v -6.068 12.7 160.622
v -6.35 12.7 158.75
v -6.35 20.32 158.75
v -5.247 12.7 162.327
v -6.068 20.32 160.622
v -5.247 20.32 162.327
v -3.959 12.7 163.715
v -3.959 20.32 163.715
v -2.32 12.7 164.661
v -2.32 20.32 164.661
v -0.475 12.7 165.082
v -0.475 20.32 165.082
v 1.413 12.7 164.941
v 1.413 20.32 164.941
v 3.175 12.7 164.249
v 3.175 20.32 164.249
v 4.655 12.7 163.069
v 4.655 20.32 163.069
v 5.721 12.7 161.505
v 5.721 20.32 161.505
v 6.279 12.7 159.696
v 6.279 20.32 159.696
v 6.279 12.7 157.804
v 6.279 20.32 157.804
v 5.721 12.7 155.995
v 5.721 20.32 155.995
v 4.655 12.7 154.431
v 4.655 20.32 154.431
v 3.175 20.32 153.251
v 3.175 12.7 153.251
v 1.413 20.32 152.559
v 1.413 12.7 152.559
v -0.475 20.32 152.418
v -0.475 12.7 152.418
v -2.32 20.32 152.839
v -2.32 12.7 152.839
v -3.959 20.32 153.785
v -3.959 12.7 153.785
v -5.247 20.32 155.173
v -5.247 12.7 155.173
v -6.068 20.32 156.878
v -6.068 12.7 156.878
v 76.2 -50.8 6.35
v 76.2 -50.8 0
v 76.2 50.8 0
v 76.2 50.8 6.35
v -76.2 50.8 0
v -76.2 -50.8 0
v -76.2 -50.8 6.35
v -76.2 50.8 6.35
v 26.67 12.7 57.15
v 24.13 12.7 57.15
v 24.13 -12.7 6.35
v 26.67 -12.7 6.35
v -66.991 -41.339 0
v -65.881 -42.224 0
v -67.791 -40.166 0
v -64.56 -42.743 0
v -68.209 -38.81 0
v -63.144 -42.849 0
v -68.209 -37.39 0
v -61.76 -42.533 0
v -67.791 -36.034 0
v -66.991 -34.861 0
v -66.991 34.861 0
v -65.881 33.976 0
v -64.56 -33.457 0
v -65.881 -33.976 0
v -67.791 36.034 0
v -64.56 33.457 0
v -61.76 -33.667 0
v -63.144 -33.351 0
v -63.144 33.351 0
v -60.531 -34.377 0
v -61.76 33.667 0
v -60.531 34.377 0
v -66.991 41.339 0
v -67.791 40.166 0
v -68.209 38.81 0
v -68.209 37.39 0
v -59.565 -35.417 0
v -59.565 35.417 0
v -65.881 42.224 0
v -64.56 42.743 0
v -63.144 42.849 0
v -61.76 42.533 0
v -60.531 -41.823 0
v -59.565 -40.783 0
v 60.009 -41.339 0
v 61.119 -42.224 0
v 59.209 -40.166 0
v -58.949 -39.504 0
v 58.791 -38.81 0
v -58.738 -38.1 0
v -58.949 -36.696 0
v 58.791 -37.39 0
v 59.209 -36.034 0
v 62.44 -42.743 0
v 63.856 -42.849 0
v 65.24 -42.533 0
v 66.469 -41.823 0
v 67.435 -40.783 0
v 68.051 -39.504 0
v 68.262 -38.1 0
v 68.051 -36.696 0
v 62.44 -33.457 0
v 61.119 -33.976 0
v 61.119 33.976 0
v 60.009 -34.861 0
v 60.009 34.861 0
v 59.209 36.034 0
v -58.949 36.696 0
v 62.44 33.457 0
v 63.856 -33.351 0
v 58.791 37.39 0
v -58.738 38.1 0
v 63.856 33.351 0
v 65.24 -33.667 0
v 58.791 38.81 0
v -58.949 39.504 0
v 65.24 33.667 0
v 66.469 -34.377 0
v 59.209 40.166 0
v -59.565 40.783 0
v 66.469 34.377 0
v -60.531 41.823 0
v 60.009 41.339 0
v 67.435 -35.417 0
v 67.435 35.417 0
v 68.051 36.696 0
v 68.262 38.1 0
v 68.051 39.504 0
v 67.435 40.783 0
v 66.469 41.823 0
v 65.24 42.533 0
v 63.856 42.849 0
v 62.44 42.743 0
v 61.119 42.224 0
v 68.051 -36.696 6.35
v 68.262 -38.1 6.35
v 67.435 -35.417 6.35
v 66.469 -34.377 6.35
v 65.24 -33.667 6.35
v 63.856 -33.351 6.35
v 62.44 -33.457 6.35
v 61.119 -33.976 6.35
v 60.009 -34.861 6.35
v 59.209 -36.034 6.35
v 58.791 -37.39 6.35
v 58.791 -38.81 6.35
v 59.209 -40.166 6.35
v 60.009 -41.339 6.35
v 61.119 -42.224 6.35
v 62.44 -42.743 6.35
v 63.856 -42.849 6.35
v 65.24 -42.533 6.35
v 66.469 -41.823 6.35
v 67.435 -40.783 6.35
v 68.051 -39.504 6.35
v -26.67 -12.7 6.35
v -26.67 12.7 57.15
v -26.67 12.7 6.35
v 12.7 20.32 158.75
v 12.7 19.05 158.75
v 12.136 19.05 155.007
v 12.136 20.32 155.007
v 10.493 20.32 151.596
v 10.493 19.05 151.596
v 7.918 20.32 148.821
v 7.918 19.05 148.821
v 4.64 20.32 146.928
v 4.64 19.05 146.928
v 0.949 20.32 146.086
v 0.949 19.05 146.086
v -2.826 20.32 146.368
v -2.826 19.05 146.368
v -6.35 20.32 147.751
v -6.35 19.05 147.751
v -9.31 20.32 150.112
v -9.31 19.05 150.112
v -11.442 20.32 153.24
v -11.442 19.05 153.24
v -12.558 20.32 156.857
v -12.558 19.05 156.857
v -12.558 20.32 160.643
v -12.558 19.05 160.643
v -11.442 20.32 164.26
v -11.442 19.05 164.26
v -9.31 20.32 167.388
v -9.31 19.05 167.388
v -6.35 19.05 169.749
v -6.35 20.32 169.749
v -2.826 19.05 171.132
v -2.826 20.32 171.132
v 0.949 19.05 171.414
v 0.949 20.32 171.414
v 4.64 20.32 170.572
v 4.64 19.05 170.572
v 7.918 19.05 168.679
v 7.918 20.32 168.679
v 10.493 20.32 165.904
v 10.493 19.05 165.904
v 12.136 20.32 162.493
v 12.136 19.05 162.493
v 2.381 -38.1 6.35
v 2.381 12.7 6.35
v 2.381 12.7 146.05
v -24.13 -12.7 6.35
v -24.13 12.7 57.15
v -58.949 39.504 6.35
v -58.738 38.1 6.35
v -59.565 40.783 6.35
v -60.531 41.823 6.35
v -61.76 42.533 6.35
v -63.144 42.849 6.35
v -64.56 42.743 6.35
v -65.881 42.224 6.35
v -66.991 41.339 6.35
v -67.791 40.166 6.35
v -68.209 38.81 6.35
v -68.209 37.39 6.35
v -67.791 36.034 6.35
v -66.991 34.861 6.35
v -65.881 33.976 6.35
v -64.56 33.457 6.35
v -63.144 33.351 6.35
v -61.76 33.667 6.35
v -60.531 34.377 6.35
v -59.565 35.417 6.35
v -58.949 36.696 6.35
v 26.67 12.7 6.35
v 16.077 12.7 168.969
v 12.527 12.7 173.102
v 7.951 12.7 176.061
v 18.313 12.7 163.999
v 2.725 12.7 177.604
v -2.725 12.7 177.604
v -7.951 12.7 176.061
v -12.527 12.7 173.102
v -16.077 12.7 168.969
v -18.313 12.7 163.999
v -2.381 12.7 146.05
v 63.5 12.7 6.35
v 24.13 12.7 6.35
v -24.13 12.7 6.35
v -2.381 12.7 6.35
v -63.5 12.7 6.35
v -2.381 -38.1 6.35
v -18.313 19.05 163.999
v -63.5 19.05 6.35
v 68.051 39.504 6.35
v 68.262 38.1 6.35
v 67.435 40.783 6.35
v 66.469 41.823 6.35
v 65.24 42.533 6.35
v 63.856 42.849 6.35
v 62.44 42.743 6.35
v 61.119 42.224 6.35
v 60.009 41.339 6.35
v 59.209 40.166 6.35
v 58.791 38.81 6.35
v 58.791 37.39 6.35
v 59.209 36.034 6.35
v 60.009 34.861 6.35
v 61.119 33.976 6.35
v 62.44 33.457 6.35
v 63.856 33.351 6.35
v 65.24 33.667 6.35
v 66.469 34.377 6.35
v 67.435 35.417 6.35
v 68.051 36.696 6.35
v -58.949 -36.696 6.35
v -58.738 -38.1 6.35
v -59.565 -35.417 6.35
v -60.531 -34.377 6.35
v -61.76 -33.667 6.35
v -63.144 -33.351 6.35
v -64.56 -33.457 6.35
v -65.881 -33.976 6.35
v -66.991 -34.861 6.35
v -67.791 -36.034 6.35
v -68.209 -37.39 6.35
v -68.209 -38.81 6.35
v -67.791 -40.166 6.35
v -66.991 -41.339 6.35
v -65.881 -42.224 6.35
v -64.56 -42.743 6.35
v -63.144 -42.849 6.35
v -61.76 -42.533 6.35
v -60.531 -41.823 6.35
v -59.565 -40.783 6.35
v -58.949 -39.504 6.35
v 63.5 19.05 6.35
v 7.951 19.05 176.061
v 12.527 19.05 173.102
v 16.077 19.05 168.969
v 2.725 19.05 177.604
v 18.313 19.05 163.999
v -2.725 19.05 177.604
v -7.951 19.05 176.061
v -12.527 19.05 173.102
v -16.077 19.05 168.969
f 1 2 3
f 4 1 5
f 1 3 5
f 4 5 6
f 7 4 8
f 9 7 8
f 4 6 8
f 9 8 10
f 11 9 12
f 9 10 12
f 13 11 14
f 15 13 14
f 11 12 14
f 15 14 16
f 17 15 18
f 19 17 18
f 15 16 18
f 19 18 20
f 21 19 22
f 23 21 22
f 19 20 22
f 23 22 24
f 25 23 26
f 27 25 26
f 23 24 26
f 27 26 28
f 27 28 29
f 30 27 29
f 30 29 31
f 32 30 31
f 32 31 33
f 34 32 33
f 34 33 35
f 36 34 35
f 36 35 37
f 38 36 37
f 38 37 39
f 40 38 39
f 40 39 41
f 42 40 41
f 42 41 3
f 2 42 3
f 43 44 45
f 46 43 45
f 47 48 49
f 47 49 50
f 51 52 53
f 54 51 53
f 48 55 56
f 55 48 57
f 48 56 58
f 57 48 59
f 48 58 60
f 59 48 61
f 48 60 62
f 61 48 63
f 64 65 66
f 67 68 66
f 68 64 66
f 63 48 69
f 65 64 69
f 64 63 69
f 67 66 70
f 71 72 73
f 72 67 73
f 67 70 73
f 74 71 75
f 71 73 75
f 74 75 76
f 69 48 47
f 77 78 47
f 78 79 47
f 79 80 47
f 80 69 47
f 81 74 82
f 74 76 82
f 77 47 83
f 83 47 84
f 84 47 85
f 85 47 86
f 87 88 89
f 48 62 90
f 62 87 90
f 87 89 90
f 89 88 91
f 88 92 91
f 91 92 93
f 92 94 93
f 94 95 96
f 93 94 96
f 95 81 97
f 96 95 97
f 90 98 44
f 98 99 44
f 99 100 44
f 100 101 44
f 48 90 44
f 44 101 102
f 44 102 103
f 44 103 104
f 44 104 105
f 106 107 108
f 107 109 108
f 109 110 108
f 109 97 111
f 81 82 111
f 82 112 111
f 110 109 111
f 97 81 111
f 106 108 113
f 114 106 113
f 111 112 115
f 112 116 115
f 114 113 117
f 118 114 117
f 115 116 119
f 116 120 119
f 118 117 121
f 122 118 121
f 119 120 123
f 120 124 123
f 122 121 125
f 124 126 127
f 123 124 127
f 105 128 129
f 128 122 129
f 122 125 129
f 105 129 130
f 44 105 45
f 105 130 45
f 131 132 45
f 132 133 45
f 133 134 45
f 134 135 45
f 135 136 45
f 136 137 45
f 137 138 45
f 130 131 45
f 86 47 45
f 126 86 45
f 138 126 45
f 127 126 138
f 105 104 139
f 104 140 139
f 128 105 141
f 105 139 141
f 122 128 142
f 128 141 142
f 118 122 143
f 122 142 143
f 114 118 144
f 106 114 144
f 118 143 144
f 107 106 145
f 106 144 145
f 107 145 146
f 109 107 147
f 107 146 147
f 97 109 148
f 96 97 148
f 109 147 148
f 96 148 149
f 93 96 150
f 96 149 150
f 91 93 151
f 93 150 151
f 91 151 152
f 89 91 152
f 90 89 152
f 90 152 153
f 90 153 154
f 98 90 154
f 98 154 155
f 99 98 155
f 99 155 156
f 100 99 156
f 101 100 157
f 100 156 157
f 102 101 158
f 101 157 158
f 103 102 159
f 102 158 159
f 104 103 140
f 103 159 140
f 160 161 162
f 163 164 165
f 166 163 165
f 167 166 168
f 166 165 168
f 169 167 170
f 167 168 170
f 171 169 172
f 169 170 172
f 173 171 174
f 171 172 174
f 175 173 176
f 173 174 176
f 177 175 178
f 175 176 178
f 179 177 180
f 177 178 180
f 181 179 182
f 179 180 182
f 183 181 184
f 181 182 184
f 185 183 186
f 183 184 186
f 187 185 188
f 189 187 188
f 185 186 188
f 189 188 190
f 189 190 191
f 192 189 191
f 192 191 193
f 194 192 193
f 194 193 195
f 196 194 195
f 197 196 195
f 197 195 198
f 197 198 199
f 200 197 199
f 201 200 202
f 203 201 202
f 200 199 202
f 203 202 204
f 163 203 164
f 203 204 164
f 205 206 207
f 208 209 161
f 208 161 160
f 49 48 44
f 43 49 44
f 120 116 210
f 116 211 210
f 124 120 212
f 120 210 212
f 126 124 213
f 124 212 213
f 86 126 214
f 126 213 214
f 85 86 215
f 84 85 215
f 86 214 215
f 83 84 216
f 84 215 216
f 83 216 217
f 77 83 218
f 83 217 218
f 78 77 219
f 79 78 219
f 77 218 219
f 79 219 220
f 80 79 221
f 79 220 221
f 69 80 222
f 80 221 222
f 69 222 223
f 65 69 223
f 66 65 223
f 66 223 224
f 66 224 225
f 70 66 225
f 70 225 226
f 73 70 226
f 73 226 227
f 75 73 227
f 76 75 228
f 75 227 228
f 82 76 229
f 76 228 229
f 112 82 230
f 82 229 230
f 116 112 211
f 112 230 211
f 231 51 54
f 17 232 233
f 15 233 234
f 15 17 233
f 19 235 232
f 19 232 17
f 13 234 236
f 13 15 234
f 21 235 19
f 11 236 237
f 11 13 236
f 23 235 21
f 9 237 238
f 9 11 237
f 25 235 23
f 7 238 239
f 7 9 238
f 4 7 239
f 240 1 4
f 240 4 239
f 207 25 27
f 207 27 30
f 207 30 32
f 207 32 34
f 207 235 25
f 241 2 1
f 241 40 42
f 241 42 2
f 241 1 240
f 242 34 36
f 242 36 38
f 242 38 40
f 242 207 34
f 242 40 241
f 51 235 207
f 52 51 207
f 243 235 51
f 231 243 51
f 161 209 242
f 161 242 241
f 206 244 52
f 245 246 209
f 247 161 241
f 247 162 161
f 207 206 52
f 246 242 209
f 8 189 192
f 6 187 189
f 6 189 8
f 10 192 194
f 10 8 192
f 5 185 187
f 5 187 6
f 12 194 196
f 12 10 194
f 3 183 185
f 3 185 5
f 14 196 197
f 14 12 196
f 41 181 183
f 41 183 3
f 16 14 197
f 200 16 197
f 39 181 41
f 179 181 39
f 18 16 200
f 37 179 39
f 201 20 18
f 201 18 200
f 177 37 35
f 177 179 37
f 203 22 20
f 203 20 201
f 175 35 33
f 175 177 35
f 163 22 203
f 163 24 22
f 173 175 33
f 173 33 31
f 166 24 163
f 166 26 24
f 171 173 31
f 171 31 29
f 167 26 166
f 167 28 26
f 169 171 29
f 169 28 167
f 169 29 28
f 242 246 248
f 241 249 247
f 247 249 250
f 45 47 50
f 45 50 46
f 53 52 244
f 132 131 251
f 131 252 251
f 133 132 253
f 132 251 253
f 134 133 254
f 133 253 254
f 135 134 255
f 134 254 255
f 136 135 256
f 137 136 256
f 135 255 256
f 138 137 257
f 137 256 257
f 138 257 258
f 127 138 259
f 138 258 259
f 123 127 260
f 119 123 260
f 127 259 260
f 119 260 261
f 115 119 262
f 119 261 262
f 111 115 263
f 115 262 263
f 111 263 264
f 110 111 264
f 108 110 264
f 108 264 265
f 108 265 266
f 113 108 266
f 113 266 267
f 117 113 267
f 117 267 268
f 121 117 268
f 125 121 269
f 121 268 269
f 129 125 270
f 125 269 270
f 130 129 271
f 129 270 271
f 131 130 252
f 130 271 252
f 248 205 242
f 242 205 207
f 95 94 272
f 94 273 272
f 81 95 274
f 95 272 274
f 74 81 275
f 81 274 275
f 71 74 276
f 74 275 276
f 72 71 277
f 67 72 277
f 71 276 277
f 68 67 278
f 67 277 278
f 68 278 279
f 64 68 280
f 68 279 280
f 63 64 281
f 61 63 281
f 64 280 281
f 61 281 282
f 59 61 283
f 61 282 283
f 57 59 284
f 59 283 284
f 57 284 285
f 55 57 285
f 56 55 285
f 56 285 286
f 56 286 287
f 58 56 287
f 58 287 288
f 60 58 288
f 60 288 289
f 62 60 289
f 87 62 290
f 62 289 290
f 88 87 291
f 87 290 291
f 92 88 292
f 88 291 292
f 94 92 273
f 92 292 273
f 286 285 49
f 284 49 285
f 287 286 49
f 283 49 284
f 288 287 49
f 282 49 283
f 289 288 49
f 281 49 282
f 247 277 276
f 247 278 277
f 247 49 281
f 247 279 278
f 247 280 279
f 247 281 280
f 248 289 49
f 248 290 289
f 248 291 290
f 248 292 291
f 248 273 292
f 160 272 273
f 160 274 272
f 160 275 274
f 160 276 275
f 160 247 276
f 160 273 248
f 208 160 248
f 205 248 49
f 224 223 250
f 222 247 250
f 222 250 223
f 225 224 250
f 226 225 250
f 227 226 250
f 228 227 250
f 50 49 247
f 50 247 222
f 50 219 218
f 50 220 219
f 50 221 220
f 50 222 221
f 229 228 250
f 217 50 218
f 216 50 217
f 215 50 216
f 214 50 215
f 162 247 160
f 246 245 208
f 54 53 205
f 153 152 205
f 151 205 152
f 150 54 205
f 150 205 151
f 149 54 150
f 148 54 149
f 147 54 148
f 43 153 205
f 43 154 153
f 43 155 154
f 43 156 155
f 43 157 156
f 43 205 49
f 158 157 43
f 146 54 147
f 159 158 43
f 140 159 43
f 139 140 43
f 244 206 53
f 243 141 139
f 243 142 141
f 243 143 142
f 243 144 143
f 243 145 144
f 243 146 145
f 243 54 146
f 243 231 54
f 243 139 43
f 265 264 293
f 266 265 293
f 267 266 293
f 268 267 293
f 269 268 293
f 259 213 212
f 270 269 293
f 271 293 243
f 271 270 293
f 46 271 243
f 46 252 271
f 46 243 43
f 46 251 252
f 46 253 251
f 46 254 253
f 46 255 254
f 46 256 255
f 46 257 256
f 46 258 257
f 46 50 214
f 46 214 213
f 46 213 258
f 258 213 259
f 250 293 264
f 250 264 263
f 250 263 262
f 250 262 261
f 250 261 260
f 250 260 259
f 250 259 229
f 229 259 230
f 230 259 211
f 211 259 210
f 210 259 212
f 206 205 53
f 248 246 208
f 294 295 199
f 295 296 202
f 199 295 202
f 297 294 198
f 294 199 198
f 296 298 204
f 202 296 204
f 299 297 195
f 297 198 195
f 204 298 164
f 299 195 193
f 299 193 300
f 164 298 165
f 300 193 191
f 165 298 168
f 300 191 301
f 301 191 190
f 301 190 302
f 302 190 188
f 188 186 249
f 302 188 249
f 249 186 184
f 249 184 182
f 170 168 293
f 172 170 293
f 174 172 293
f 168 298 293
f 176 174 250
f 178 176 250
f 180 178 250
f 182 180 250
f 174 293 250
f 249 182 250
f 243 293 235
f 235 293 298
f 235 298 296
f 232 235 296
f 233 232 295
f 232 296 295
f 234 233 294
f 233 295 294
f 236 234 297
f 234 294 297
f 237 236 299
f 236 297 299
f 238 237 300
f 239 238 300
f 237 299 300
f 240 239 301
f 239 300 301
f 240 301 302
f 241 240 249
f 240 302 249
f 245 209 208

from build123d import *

# Parameters (mm, degrees)
SKETCH1_W            = 152.4
SKETCH1_H            = 101.6
BOSS_EXTRUDE1_DEPTH  = 6.35
BOSS_EXTRUDE2_DEPTH  = 6.35
SKETCH5_R            = 12.7
BOSS_EXTRUDE3_DEPTH  = 1.27
BOSS_EXTRUDE4_DEPTH  = 2.38125
RIB1_REACH           = 212.988
SKETCH7_WALL_W       = 480.772618864
SKETCH7_WALL_H       = 2.54
SKETCH8_R            = 6.35
CUT_EXTRUDE1_DEPTH   = 207.100301795
SKETCH9_R            = 4.7625
CUT_EXTRUDE2_DEPTH   = 195.376393886
LPATTERN1_COUNT      = 2
LPATTERN1_PITCH      = 127
LPATTERN1_COUNT_DIR2 = 2
LPATTERN1_PITCH_DIR2 = 76.2


with BuildPart() as part:
    # Sketch1 → Boss-Extrude1 (new body)
    with BuildSketch(Plane.XY):
        Rectangle(SKETCH1_W, SKETCH1_H)
    extrude(amount=BOSS_EXTRUDE1_DEPTH)

    # Sketch4 → Boss-Extrude2 (add)
    with BuildSketch(Plane(origin=(0, 19.05, 0), x_dir=(1, 0, 0), z_dir=(0, 1, 0))):
        with BuildLine():
            Line((63.5, -6.35), (18.312580006, -163.998991669))
            ThreePointArc((18.312580006, -163.998991669), (0, -177.8), (-18.312580006, -163.998991669))
            Line((-18.312580006, -163.998991669), (-63.5, -6.35))
            Line((-63.5, -6.35), (63.5, -6.35))
        make_face()
    extrude(amount=-BOSS_EXTRUDE2_DEPTH)

    # Sketch5 → Boss-Extrude3 (add)
    with BuildSketch(Plane(origin=(0, 19.05, 0), x_dir=(1, 0, 0), z_dir=(0, 1, 0))):
        with Locations((0, -158.75)):
            Circle(SKETCH5_R)
    extrude(amount=BOSS_EXTRUDE3_DEPTH)

    # Sketch6 → Boss-Extrude4 (add, symmetric)
    with BuildSketch(Plane(origin=(0, 0, 0), x_dir=(0, 0, -1), z_dir=(1, 0, 0))):
        Polygon((-6.35, -38.1), (-146.05, 12.7), (-6.35, 12.7), align=None)
    extrude(amount=BOSS_EXTRUDE4_DEPTH, both=True)

    # Sketch7 wall → Rib1 (add, up to next)
    with BuildSketch(Plane(origin=(25.4, 0, 31.75), x_dir=(0, -0.4472135955, -0.894427191), z_dir=(0, 0.894427191, -0.4472135955)), mode=Mode.PRIVATE) as rib1_sk1:
        Rectangle(SKETCH7_WALL_W, SKETCH7_WALL_H)
    rib1_tool1 = extrude(rib1_sk1.sketch, amount=RIB1_REACH, mode=Mode.PRIVATE) - part.part
    rib1 = rib1_tool1.solids().sort_by_distance((25.4, 0, 31.75))[0]
    add(rib1)

    # Mirror1: Rib1 across plane
    add(rib1.mirror(Plane(origin=(0, 0, 0), x_dir=(0, 0, 1), z_dir=(1, 0, 0))))

    # Sketch8 → Cut-Extrude1 (cut, through all)
    with BuildSketch(Plane(origin=(0, 20.32, 0), x_dir=(1, 0, 0), z_dir=(0, 1, 0))):
        with Locations(Location((0, -158.75, 0), (0, 0, 180))):
            Circle(SKETCH8_R)
    extrude(amount=-CUT_EXTRUDE1_DEPTH, mode=Mode.SUBTRACT)

    # Sketch9 → Cut-Extrude2 (cut, symmetric)
    with BuildSketch(Plane.XY.offset(6.35)):
        with Locations((-63.5, 38.1)):
            Circle(SKETCH9_R)
    cut_extrude2 = extrude(amount=CUT_EXTRUDE2_DEPTH, both=True, mode=Mode.SUBTRACT)

    # LPattern1: Cut-Extrude2 2 × 2
    with Locations(*[(i * LPATTERN1_PITCH, -j * LPATTERN1_PITCH_DIR2, 0) for i in range(LPATTERN1_COUNT) for j in range(LPATTERN1_COUNT_DIR2) if (i, j) != (0, 0)]):
        add(cut_extrude2, mode=Mode.SUBTRACT)


solid = part.part
